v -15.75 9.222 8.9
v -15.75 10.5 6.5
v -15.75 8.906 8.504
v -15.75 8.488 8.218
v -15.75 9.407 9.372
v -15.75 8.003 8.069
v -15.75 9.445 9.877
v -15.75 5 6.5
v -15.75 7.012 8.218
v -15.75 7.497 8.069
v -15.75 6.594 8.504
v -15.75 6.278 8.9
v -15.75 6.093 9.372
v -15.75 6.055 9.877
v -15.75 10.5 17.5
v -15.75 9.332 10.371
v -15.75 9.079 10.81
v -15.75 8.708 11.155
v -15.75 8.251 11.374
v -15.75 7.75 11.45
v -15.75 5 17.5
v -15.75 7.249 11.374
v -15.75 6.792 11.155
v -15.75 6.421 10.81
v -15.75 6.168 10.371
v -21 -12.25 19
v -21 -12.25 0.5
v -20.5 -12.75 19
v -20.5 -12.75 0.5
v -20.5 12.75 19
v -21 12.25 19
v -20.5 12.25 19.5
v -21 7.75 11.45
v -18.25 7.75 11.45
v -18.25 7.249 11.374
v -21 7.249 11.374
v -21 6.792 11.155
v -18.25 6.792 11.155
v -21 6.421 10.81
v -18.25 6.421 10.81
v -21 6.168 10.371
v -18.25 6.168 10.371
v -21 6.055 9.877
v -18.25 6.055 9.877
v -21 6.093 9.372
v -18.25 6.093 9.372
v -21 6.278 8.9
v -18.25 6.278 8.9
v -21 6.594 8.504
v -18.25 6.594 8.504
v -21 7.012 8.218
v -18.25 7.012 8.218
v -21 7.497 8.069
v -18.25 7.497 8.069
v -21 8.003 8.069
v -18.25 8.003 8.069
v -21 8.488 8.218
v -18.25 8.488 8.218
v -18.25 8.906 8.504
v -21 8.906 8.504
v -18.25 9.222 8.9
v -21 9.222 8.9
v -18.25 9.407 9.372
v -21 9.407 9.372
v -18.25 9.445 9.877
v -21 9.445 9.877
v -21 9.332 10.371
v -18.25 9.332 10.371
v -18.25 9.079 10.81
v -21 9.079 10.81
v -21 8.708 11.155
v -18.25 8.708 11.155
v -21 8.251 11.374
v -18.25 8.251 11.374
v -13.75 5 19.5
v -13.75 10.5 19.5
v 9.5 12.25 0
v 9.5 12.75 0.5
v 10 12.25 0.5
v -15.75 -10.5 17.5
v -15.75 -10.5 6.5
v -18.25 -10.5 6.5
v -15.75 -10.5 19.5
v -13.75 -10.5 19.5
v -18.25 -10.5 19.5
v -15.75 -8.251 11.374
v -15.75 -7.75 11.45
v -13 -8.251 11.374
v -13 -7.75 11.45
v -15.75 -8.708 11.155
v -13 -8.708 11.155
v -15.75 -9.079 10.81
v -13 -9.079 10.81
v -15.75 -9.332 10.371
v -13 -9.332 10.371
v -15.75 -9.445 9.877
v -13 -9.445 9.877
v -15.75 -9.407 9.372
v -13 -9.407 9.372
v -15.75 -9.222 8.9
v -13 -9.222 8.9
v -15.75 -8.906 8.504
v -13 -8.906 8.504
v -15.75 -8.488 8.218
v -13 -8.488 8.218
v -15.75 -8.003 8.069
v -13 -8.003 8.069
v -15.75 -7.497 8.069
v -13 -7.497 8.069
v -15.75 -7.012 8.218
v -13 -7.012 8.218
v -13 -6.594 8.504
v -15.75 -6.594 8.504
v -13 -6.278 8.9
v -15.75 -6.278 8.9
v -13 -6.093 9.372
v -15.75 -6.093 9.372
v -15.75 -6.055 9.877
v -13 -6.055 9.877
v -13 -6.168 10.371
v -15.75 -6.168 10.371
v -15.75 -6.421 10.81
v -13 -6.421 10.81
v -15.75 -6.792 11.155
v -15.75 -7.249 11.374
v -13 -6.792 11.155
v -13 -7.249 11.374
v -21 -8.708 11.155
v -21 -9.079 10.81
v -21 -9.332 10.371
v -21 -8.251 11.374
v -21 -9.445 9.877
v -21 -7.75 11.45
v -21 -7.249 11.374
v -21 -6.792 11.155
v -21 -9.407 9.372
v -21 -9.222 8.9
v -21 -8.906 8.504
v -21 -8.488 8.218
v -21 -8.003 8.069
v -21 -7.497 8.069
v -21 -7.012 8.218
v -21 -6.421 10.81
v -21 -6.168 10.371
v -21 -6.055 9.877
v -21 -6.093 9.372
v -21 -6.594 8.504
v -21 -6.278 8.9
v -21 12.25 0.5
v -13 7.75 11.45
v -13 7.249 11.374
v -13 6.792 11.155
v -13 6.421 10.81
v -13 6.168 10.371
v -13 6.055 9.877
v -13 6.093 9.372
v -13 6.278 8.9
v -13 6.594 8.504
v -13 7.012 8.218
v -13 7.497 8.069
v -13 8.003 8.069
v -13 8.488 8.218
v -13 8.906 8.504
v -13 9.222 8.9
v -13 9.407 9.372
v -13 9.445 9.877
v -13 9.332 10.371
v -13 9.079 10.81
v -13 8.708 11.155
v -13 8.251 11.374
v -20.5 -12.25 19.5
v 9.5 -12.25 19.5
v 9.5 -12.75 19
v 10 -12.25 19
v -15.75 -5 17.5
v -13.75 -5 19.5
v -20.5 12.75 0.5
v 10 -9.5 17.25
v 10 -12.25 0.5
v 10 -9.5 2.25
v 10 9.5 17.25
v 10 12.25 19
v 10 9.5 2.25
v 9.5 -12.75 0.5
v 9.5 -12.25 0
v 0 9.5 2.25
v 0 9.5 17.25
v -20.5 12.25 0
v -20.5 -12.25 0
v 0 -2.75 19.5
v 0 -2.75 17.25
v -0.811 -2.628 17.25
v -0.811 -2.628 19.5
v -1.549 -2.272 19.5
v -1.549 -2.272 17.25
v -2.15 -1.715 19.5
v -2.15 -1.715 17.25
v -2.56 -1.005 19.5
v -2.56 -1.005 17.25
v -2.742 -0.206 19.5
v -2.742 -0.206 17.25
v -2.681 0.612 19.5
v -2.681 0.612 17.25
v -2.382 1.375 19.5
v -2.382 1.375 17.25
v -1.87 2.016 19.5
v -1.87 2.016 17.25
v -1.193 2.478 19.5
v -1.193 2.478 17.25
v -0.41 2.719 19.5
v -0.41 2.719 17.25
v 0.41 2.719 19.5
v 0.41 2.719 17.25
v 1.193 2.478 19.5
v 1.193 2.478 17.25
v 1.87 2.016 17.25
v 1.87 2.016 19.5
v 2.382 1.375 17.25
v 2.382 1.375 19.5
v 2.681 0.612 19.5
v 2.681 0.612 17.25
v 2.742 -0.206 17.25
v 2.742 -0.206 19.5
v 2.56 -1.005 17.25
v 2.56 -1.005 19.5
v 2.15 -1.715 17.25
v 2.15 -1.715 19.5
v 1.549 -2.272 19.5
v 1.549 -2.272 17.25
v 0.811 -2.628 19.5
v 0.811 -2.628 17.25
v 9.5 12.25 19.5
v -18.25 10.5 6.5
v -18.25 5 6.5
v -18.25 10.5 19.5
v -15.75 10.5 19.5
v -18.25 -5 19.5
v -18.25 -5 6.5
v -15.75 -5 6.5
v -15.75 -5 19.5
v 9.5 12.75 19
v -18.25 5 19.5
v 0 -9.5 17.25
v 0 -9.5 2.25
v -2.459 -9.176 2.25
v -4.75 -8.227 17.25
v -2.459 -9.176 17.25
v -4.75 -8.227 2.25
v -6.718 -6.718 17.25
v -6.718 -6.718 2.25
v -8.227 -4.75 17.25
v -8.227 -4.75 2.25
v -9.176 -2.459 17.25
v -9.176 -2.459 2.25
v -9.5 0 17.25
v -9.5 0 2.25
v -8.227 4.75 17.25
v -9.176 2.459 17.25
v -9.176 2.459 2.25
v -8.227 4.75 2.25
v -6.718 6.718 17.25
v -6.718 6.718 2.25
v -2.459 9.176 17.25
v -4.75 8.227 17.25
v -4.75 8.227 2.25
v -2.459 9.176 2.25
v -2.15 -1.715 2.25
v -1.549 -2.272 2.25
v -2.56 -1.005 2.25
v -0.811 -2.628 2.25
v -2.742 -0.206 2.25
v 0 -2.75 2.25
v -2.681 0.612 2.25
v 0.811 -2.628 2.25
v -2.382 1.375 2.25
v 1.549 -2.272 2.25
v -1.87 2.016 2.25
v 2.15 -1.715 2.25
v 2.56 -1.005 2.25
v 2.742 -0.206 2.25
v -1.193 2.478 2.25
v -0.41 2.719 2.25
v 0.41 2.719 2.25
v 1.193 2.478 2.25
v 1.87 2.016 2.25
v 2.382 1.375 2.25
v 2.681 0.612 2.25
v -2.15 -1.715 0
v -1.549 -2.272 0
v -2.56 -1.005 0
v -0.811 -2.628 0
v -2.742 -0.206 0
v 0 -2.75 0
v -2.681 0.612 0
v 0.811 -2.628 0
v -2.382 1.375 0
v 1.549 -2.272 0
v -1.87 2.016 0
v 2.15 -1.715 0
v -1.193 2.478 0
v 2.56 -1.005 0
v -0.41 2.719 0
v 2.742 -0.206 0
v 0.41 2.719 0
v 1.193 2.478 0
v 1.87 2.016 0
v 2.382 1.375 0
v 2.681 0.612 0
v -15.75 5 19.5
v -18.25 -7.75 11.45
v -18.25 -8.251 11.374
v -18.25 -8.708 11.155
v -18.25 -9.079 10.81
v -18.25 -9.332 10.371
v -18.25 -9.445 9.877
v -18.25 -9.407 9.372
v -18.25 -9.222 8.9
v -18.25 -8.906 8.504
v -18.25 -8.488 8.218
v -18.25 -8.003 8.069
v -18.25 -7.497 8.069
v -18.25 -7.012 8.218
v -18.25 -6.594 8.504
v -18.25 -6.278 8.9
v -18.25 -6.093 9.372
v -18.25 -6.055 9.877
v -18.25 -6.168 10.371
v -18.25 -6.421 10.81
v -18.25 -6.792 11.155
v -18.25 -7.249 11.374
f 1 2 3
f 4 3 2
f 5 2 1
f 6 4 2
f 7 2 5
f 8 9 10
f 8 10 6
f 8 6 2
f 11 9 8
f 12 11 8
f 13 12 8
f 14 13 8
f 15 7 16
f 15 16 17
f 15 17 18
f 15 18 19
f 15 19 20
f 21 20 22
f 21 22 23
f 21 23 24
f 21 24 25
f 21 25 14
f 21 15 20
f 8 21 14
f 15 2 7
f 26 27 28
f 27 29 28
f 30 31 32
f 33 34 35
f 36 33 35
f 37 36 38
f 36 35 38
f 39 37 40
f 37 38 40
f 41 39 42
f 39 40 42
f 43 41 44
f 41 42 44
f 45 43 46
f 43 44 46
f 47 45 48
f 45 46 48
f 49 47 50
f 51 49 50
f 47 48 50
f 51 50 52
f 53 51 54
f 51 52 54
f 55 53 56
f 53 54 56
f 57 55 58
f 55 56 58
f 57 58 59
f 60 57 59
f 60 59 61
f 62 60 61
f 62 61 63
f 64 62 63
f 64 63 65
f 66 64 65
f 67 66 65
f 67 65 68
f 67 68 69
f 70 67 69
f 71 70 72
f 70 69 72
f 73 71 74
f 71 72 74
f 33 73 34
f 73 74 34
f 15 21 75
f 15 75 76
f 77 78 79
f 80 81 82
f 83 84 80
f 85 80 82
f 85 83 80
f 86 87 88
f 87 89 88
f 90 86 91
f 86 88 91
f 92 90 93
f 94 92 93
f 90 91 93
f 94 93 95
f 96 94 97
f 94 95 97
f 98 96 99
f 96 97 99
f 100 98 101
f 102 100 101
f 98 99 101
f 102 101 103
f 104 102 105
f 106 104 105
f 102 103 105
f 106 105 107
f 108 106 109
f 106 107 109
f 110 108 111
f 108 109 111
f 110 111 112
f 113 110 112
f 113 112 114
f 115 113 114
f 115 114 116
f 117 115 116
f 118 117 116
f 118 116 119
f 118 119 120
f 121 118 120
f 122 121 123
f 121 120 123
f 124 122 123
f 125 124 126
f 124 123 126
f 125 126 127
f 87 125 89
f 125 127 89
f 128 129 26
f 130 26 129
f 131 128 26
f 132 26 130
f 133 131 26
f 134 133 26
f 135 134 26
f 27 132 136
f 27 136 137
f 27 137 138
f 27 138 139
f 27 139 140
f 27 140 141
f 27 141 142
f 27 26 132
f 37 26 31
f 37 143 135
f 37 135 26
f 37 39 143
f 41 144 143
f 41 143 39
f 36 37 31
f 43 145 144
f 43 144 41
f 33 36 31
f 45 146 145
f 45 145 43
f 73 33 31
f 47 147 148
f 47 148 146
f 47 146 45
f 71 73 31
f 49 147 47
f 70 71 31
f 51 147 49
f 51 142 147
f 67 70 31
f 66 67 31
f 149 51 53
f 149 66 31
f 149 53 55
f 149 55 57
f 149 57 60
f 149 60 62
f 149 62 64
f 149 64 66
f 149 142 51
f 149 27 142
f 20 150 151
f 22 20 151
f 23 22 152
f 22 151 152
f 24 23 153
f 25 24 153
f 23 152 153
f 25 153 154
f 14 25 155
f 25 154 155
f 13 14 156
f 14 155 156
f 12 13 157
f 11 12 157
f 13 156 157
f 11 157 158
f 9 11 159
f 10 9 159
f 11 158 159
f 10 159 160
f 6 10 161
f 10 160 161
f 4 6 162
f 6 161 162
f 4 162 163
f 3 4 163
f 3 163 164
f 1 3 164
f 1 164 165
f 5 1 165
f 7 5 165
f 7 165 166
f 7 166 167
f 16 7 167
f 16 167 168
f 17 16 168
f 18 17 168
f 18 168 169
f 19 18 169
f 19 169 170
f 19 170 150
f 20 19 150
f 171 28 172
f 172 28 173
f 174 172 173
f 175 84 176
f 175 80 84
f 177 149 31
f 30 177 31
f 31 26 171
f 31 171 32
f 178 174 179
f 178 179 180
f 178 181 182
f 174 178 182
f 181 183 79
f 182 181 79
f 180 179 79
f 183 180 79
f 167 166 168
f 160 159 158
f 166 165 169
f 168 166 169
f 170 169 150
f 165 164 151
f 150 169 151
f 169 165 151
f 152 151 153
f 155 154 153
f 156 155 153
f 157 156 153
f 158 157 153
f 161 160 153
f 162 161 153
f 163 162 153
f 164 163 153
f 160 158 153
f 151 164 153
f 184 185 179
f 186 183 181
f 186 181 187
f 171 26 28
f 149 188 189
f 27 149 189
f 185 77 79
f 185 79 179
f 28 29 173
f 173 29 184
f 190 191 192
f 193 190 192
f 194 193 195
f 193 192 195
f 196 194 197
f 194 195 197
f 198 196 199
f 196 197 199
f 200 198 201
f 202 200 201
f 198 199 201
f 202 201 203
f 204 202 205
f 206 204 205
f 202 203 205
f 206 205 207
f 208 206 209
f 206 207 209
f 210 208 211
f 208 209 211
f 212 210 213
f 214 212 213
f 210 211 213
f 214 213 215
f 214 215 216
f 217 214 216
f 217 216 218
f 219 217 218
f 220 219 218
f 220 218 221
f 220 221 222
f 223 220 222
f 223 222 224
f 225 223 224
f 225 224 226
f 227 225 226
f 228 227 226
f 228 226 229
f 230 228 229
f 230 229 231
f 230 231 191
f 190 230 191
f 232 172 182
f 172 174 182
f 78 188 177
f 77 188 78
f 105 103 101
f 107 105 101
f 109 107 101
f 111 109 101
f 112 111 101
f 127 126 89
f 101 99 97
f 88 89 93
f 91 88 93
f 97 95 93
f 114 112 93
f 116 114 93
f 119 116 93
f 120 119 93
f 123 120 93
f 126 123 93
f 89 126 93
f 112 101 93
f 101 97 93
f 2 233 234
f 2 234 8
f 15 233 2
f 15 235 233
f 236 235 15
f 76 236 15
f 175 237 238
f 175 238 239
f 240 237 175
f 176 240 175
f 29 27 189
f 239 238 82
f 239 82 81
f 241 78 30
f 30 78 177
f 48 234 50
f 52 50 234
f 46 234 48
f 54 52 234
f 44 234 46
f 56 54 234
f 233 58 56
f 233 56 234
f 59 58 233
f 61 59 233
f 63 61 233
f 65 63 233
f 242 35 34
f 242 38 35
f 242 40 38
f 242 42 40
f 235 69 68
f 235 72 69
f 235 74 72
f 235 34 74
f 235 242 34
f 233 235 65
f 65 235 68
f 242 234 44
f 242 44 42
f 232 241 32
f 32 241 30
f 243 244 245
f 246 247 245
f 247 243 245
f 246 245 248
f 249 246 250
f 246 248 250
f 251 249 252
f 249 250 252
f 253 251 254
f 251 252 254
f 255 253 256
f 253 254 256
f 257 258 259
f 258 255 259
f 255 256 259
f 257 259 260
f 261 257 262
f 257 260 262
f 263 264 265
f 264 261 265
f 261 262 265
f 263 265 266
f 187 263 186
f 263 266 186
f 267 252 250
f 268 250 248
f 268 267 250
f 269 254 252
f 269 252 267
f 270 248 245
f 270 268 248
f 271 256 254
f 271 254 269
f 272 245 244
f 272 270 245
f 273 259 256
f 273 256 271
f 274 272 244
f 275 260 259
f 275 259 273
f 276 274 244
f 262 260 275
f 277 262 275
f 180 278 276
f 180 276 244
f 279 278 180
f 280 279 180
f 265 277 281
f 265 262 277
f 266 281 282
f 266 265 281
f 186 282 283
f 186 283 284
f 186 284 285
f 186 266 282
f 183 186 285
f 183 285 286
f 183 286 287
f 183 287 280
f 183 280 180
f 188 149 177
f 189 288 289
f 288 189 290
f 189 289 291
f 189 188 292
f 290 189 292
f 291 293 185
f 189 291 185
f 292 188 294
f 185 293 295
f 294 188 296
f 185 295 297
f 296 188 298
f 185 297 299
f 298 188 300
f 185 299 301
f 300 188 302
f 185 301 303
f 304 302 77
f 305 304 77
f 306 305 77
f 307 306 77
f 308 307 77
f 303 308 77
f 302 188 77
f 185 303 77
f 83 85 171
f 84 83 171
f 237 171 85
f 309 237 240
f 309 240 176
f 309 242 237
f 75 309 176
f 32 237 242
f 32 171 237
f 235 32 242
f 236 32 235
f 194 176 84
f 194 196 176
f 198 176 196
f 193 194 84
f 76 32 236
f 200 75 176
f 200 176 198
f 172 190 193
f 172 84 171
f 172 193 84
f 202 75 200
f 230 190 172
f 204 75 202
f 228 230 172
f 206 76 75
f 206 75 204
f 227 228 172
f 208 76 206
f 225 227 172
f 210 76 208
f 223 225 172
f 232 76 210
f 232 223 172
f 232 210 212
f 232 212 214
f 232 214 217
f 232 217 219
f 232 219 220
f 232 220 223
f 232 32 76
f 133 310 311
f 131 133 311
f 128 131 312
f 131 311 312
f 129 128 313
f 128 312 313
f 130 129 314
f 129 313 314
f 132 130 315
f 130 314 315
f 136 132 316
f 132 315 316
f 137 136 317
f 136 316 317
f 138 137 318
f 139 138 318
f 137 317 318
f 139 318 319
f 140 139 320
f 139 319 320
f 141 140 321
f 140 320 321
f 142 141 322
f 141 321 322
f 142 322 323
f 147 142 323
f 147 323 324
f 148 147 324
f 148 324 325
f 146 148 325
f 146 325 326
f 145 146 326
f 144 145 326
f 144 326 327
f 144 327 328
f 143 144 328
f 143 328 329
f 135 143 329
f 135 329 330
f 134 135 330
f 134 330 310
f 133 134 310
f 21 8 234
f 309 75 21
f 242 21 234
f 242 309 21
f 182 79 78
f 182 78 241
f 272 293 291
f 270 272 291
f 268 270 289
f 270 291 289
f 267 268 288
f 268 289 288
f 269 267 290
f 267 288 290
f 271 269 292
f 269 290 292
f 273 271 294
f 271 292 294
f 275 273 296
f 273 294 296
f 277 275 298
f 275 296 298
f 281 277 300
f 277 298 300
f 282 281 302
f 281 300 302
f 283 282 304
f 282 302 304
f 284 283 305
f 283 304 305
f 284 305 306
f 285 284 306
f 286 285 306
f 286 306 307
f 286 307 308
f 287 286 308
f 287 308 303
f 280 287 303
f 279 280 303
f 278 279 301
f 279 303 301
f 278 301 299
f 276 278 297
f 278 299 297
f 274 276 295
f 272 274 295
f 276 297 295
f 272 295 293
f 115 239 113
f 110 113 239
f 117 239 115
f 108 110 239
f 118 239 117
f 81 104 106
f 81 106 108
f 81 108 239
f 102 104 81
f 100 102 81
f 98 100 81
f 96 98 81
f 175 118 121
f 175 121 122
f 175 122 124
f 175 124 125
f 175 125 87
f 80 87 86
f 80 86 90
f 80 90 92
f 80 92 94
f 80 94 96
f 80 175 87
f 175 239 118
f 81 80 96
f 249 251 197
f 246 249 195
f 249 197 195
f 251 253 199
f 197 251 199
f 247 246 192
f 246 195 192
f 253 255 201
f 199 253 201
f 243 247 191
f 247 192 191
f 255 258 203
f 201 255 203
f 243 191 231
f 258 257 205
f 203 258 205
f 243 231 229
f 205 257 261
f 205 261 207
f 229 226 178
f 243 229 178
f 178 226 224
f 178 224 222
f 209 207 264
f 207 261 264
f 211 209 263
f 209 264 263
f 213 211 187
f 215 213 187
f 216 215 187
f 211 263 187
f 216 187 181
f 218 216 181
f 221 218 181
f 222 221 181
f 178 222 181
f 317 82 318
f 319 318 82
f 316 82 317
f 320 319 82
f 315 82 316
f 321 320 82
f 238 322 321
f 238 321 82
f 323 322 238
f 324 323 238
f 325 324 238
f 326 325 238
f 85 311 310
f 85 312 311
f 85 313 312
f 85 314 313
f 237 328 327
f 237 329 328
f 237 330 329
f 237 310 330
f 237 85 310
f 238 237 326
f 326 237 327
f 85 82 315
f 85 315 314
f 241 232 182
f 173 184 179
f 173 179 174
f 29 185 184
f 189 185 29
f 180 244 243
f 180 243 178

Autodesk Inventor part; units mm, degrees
ref_plane "YZ Plane" through (0, 0, 0) normal (1, 0, 0) x (0, 1, 0)
ref_plane "XZ Plane" through (0, 0, 0) normal (0, 1, 0) x (-1, 0, 0)
sketch "Sketch1" plane through (0, 0, 0) normal (0, 0, 1) x (1, 0, 0)
  circle A0 centre (0, 0) radius 6
  line L0 (-10, -12.75) -> (10, -12.75)
  line L1 (10, -12.75) -> (10, 12.75)
  line L2 (10, 12.75) -> (-10, 12.75)
  line L3 (-10, 12.75) -> (-10, -12.75)
  line L4 (-10, -12.75) -> (10, 12.75) construction
  line L5 (10, -12.75) -> (-10, 12.75) construction
  line L6 (-10, -12.75) -> (-21, -12.75)
  line L7 (-21, -12.75) -> (-21, 12.75)
  line L8 (-21, 12.75) -> (-10, 12.75)
  line L9 (-10, 12.75) -> (-10, -12.75)
  dimension "d0" = 12
  dimension "d1" = 25.5
  dimension "d2" = 20
  dimension "d20" = 11
extrude "Extrusion1" add sketch "Sketch1" along normal blind 19.5 contours A0 | L3 L2 L1 L0 | L6 L7 L8 L3
ref_plane "Work Plane1" through (0, 0, 9.75) normal (0, 0, 1) x (1, 0, 0)
sketch "Sketch2" plane through (0, 0, 9.75) normal (0, 0, 1) x (1, 0, 0)
  circle A0 centre (0, 0) radius 9.5
  line L0 (-10, -9.5) -> (10, -9.5)
  line L1 (10, -9.5) -> (10, 9.5)
  line L2 (10, 9.5) -> (-10, 9.5)
  line L3 (-10, 9.5) -> (-10, -9.5)
  line L4 (-10, -9.5) -> (10, 9.5) construction
  line L5 (10, -9.5) -> (-10, 9.5) construction
  point P0 (0, 9.5)
  point P1 (0, -9.5)
  dimension "d5" = 19
  dimension "d6" = 20
  dimension "d7" = 19
extrude "Extrusion2" cut sketch "Sketch2" along normal mid plane 15 contours A0 | A0 L2 L1 L0
sketch "Sketch3" plane through (0, 0, 19.5) normal (0, 0, 1) x (1, 0, 0)
  point P0 (0, 0)
  point P1 (0, 0)
hole "Hole1" at (0, 0, 19.5) direction (0, 0, -1) diameter 5.5 end through all clearance for "Socket Head Cap Screw" size "M5" standard "Ansi Metric M Profile"
sketch "Sketch4" plane through (-21, -12.75, 0) normal (-1, 0, 0) x (0, 0, 1)
  line L0 (0, 25.5) -> (19.5, 25.5) projected
  line L1 (9.75, 25.5) -> (9.75, 0)
  line L2 (0, 0) -> (19.5, 0) projected
  point P0 (9.75, 20.5)
  point P1 (9.75, 5)
  dimension "d21" = 5
  dimension "d22" = 5
hole "Hole2" at (-21, 7.75, 9.75) at (-21, -7.75, 9.75) direction (1, 0, 0) diameter 3.4 depth 8 clearance for "Hex Head Machine Screw" size "M3" standard "Ansi Metric M Profile"
sketch "Sketch5" plane through (0, 0, 19.5) normal (0, 0, 1) x (1, 0, 0)
  line L0 (-21, 6.05) -> (-21, 9.45) projected
  line L1 (-13, 9.45) -> (-13, 6.05) projected
  line L2 (-21, -9.45) -> (-21, -6.05) projected
  line L3 (-13, -6.05) -> (-13, -9.45) projected
  line L4 (-21, 7.75) -> (-13, 7.75)
  line L5 (-21, -7.75) -> (-13, -7.75)
  line L6 (-18.25, 10.5) -> (-15.75, 10.5)
  line L7 (-15.75, 10.5) -> (-15.75, 5)
  line L8 (-15.75, 5) -> (-18.25, 5)
  line L9 (-18.25, 5) -> (-18.25, 10.5)
  line L10 (-18.25, 10.5) -> (-15.75, 5) construction
  line L11 (-15.75, 10.5) -> (-18.25, 5) construction
  line L12 (-18.25, -5) -> (-15.75, -5)
  line L13 (-15.75, -5) -> (-15.75, -10.5)
  line L14 (-15.75, -10.5) -> (-18.25, -10.5)
  line L15 (-18.25, -10.5) -> (-18.25, -5)
  line L16 (-18.25, -5) -> (-15.75, -10.5) construction
  line L17 (-15.75, -5) -> (-18.25, -10.5) construction
  point P0 (0, 0)
  point P1 (-17, 7.75)
  point P2 (-17, -7.75)
  dimension "d30" = 2.5
  dimension "d31" = 5.5
  dimension "d32" = 2.5
  dimension "d33" = 5.5
extrude "Extrusion3" cut sketch "Sketch5" against normal blind 13
chamfer "Chamfer1" distance 2 angle 45 2 edges at (-15.75, 7.75, 19.5) (-15.75, -7.75, 19.5)
chamfer "Chamfer2" distance 0.5 angle 45 12 edges at (-21, 12.75, 9.75) (-21, 0, 0) (-21, -12.75, 9.75) (-21, 0, 19.5) (-5.5, 12.75, 19.5) (-5.5, 12.75, 0) (-5.5, -12.75, 0) (-5.5, -12.75, 19.5) (10, 0, 19.5) (10, 12.75, 9.75) (10, 0, 0) (10, -12.75, 9.75)
properties part number "X-End-Floating-Idler v0.1"
